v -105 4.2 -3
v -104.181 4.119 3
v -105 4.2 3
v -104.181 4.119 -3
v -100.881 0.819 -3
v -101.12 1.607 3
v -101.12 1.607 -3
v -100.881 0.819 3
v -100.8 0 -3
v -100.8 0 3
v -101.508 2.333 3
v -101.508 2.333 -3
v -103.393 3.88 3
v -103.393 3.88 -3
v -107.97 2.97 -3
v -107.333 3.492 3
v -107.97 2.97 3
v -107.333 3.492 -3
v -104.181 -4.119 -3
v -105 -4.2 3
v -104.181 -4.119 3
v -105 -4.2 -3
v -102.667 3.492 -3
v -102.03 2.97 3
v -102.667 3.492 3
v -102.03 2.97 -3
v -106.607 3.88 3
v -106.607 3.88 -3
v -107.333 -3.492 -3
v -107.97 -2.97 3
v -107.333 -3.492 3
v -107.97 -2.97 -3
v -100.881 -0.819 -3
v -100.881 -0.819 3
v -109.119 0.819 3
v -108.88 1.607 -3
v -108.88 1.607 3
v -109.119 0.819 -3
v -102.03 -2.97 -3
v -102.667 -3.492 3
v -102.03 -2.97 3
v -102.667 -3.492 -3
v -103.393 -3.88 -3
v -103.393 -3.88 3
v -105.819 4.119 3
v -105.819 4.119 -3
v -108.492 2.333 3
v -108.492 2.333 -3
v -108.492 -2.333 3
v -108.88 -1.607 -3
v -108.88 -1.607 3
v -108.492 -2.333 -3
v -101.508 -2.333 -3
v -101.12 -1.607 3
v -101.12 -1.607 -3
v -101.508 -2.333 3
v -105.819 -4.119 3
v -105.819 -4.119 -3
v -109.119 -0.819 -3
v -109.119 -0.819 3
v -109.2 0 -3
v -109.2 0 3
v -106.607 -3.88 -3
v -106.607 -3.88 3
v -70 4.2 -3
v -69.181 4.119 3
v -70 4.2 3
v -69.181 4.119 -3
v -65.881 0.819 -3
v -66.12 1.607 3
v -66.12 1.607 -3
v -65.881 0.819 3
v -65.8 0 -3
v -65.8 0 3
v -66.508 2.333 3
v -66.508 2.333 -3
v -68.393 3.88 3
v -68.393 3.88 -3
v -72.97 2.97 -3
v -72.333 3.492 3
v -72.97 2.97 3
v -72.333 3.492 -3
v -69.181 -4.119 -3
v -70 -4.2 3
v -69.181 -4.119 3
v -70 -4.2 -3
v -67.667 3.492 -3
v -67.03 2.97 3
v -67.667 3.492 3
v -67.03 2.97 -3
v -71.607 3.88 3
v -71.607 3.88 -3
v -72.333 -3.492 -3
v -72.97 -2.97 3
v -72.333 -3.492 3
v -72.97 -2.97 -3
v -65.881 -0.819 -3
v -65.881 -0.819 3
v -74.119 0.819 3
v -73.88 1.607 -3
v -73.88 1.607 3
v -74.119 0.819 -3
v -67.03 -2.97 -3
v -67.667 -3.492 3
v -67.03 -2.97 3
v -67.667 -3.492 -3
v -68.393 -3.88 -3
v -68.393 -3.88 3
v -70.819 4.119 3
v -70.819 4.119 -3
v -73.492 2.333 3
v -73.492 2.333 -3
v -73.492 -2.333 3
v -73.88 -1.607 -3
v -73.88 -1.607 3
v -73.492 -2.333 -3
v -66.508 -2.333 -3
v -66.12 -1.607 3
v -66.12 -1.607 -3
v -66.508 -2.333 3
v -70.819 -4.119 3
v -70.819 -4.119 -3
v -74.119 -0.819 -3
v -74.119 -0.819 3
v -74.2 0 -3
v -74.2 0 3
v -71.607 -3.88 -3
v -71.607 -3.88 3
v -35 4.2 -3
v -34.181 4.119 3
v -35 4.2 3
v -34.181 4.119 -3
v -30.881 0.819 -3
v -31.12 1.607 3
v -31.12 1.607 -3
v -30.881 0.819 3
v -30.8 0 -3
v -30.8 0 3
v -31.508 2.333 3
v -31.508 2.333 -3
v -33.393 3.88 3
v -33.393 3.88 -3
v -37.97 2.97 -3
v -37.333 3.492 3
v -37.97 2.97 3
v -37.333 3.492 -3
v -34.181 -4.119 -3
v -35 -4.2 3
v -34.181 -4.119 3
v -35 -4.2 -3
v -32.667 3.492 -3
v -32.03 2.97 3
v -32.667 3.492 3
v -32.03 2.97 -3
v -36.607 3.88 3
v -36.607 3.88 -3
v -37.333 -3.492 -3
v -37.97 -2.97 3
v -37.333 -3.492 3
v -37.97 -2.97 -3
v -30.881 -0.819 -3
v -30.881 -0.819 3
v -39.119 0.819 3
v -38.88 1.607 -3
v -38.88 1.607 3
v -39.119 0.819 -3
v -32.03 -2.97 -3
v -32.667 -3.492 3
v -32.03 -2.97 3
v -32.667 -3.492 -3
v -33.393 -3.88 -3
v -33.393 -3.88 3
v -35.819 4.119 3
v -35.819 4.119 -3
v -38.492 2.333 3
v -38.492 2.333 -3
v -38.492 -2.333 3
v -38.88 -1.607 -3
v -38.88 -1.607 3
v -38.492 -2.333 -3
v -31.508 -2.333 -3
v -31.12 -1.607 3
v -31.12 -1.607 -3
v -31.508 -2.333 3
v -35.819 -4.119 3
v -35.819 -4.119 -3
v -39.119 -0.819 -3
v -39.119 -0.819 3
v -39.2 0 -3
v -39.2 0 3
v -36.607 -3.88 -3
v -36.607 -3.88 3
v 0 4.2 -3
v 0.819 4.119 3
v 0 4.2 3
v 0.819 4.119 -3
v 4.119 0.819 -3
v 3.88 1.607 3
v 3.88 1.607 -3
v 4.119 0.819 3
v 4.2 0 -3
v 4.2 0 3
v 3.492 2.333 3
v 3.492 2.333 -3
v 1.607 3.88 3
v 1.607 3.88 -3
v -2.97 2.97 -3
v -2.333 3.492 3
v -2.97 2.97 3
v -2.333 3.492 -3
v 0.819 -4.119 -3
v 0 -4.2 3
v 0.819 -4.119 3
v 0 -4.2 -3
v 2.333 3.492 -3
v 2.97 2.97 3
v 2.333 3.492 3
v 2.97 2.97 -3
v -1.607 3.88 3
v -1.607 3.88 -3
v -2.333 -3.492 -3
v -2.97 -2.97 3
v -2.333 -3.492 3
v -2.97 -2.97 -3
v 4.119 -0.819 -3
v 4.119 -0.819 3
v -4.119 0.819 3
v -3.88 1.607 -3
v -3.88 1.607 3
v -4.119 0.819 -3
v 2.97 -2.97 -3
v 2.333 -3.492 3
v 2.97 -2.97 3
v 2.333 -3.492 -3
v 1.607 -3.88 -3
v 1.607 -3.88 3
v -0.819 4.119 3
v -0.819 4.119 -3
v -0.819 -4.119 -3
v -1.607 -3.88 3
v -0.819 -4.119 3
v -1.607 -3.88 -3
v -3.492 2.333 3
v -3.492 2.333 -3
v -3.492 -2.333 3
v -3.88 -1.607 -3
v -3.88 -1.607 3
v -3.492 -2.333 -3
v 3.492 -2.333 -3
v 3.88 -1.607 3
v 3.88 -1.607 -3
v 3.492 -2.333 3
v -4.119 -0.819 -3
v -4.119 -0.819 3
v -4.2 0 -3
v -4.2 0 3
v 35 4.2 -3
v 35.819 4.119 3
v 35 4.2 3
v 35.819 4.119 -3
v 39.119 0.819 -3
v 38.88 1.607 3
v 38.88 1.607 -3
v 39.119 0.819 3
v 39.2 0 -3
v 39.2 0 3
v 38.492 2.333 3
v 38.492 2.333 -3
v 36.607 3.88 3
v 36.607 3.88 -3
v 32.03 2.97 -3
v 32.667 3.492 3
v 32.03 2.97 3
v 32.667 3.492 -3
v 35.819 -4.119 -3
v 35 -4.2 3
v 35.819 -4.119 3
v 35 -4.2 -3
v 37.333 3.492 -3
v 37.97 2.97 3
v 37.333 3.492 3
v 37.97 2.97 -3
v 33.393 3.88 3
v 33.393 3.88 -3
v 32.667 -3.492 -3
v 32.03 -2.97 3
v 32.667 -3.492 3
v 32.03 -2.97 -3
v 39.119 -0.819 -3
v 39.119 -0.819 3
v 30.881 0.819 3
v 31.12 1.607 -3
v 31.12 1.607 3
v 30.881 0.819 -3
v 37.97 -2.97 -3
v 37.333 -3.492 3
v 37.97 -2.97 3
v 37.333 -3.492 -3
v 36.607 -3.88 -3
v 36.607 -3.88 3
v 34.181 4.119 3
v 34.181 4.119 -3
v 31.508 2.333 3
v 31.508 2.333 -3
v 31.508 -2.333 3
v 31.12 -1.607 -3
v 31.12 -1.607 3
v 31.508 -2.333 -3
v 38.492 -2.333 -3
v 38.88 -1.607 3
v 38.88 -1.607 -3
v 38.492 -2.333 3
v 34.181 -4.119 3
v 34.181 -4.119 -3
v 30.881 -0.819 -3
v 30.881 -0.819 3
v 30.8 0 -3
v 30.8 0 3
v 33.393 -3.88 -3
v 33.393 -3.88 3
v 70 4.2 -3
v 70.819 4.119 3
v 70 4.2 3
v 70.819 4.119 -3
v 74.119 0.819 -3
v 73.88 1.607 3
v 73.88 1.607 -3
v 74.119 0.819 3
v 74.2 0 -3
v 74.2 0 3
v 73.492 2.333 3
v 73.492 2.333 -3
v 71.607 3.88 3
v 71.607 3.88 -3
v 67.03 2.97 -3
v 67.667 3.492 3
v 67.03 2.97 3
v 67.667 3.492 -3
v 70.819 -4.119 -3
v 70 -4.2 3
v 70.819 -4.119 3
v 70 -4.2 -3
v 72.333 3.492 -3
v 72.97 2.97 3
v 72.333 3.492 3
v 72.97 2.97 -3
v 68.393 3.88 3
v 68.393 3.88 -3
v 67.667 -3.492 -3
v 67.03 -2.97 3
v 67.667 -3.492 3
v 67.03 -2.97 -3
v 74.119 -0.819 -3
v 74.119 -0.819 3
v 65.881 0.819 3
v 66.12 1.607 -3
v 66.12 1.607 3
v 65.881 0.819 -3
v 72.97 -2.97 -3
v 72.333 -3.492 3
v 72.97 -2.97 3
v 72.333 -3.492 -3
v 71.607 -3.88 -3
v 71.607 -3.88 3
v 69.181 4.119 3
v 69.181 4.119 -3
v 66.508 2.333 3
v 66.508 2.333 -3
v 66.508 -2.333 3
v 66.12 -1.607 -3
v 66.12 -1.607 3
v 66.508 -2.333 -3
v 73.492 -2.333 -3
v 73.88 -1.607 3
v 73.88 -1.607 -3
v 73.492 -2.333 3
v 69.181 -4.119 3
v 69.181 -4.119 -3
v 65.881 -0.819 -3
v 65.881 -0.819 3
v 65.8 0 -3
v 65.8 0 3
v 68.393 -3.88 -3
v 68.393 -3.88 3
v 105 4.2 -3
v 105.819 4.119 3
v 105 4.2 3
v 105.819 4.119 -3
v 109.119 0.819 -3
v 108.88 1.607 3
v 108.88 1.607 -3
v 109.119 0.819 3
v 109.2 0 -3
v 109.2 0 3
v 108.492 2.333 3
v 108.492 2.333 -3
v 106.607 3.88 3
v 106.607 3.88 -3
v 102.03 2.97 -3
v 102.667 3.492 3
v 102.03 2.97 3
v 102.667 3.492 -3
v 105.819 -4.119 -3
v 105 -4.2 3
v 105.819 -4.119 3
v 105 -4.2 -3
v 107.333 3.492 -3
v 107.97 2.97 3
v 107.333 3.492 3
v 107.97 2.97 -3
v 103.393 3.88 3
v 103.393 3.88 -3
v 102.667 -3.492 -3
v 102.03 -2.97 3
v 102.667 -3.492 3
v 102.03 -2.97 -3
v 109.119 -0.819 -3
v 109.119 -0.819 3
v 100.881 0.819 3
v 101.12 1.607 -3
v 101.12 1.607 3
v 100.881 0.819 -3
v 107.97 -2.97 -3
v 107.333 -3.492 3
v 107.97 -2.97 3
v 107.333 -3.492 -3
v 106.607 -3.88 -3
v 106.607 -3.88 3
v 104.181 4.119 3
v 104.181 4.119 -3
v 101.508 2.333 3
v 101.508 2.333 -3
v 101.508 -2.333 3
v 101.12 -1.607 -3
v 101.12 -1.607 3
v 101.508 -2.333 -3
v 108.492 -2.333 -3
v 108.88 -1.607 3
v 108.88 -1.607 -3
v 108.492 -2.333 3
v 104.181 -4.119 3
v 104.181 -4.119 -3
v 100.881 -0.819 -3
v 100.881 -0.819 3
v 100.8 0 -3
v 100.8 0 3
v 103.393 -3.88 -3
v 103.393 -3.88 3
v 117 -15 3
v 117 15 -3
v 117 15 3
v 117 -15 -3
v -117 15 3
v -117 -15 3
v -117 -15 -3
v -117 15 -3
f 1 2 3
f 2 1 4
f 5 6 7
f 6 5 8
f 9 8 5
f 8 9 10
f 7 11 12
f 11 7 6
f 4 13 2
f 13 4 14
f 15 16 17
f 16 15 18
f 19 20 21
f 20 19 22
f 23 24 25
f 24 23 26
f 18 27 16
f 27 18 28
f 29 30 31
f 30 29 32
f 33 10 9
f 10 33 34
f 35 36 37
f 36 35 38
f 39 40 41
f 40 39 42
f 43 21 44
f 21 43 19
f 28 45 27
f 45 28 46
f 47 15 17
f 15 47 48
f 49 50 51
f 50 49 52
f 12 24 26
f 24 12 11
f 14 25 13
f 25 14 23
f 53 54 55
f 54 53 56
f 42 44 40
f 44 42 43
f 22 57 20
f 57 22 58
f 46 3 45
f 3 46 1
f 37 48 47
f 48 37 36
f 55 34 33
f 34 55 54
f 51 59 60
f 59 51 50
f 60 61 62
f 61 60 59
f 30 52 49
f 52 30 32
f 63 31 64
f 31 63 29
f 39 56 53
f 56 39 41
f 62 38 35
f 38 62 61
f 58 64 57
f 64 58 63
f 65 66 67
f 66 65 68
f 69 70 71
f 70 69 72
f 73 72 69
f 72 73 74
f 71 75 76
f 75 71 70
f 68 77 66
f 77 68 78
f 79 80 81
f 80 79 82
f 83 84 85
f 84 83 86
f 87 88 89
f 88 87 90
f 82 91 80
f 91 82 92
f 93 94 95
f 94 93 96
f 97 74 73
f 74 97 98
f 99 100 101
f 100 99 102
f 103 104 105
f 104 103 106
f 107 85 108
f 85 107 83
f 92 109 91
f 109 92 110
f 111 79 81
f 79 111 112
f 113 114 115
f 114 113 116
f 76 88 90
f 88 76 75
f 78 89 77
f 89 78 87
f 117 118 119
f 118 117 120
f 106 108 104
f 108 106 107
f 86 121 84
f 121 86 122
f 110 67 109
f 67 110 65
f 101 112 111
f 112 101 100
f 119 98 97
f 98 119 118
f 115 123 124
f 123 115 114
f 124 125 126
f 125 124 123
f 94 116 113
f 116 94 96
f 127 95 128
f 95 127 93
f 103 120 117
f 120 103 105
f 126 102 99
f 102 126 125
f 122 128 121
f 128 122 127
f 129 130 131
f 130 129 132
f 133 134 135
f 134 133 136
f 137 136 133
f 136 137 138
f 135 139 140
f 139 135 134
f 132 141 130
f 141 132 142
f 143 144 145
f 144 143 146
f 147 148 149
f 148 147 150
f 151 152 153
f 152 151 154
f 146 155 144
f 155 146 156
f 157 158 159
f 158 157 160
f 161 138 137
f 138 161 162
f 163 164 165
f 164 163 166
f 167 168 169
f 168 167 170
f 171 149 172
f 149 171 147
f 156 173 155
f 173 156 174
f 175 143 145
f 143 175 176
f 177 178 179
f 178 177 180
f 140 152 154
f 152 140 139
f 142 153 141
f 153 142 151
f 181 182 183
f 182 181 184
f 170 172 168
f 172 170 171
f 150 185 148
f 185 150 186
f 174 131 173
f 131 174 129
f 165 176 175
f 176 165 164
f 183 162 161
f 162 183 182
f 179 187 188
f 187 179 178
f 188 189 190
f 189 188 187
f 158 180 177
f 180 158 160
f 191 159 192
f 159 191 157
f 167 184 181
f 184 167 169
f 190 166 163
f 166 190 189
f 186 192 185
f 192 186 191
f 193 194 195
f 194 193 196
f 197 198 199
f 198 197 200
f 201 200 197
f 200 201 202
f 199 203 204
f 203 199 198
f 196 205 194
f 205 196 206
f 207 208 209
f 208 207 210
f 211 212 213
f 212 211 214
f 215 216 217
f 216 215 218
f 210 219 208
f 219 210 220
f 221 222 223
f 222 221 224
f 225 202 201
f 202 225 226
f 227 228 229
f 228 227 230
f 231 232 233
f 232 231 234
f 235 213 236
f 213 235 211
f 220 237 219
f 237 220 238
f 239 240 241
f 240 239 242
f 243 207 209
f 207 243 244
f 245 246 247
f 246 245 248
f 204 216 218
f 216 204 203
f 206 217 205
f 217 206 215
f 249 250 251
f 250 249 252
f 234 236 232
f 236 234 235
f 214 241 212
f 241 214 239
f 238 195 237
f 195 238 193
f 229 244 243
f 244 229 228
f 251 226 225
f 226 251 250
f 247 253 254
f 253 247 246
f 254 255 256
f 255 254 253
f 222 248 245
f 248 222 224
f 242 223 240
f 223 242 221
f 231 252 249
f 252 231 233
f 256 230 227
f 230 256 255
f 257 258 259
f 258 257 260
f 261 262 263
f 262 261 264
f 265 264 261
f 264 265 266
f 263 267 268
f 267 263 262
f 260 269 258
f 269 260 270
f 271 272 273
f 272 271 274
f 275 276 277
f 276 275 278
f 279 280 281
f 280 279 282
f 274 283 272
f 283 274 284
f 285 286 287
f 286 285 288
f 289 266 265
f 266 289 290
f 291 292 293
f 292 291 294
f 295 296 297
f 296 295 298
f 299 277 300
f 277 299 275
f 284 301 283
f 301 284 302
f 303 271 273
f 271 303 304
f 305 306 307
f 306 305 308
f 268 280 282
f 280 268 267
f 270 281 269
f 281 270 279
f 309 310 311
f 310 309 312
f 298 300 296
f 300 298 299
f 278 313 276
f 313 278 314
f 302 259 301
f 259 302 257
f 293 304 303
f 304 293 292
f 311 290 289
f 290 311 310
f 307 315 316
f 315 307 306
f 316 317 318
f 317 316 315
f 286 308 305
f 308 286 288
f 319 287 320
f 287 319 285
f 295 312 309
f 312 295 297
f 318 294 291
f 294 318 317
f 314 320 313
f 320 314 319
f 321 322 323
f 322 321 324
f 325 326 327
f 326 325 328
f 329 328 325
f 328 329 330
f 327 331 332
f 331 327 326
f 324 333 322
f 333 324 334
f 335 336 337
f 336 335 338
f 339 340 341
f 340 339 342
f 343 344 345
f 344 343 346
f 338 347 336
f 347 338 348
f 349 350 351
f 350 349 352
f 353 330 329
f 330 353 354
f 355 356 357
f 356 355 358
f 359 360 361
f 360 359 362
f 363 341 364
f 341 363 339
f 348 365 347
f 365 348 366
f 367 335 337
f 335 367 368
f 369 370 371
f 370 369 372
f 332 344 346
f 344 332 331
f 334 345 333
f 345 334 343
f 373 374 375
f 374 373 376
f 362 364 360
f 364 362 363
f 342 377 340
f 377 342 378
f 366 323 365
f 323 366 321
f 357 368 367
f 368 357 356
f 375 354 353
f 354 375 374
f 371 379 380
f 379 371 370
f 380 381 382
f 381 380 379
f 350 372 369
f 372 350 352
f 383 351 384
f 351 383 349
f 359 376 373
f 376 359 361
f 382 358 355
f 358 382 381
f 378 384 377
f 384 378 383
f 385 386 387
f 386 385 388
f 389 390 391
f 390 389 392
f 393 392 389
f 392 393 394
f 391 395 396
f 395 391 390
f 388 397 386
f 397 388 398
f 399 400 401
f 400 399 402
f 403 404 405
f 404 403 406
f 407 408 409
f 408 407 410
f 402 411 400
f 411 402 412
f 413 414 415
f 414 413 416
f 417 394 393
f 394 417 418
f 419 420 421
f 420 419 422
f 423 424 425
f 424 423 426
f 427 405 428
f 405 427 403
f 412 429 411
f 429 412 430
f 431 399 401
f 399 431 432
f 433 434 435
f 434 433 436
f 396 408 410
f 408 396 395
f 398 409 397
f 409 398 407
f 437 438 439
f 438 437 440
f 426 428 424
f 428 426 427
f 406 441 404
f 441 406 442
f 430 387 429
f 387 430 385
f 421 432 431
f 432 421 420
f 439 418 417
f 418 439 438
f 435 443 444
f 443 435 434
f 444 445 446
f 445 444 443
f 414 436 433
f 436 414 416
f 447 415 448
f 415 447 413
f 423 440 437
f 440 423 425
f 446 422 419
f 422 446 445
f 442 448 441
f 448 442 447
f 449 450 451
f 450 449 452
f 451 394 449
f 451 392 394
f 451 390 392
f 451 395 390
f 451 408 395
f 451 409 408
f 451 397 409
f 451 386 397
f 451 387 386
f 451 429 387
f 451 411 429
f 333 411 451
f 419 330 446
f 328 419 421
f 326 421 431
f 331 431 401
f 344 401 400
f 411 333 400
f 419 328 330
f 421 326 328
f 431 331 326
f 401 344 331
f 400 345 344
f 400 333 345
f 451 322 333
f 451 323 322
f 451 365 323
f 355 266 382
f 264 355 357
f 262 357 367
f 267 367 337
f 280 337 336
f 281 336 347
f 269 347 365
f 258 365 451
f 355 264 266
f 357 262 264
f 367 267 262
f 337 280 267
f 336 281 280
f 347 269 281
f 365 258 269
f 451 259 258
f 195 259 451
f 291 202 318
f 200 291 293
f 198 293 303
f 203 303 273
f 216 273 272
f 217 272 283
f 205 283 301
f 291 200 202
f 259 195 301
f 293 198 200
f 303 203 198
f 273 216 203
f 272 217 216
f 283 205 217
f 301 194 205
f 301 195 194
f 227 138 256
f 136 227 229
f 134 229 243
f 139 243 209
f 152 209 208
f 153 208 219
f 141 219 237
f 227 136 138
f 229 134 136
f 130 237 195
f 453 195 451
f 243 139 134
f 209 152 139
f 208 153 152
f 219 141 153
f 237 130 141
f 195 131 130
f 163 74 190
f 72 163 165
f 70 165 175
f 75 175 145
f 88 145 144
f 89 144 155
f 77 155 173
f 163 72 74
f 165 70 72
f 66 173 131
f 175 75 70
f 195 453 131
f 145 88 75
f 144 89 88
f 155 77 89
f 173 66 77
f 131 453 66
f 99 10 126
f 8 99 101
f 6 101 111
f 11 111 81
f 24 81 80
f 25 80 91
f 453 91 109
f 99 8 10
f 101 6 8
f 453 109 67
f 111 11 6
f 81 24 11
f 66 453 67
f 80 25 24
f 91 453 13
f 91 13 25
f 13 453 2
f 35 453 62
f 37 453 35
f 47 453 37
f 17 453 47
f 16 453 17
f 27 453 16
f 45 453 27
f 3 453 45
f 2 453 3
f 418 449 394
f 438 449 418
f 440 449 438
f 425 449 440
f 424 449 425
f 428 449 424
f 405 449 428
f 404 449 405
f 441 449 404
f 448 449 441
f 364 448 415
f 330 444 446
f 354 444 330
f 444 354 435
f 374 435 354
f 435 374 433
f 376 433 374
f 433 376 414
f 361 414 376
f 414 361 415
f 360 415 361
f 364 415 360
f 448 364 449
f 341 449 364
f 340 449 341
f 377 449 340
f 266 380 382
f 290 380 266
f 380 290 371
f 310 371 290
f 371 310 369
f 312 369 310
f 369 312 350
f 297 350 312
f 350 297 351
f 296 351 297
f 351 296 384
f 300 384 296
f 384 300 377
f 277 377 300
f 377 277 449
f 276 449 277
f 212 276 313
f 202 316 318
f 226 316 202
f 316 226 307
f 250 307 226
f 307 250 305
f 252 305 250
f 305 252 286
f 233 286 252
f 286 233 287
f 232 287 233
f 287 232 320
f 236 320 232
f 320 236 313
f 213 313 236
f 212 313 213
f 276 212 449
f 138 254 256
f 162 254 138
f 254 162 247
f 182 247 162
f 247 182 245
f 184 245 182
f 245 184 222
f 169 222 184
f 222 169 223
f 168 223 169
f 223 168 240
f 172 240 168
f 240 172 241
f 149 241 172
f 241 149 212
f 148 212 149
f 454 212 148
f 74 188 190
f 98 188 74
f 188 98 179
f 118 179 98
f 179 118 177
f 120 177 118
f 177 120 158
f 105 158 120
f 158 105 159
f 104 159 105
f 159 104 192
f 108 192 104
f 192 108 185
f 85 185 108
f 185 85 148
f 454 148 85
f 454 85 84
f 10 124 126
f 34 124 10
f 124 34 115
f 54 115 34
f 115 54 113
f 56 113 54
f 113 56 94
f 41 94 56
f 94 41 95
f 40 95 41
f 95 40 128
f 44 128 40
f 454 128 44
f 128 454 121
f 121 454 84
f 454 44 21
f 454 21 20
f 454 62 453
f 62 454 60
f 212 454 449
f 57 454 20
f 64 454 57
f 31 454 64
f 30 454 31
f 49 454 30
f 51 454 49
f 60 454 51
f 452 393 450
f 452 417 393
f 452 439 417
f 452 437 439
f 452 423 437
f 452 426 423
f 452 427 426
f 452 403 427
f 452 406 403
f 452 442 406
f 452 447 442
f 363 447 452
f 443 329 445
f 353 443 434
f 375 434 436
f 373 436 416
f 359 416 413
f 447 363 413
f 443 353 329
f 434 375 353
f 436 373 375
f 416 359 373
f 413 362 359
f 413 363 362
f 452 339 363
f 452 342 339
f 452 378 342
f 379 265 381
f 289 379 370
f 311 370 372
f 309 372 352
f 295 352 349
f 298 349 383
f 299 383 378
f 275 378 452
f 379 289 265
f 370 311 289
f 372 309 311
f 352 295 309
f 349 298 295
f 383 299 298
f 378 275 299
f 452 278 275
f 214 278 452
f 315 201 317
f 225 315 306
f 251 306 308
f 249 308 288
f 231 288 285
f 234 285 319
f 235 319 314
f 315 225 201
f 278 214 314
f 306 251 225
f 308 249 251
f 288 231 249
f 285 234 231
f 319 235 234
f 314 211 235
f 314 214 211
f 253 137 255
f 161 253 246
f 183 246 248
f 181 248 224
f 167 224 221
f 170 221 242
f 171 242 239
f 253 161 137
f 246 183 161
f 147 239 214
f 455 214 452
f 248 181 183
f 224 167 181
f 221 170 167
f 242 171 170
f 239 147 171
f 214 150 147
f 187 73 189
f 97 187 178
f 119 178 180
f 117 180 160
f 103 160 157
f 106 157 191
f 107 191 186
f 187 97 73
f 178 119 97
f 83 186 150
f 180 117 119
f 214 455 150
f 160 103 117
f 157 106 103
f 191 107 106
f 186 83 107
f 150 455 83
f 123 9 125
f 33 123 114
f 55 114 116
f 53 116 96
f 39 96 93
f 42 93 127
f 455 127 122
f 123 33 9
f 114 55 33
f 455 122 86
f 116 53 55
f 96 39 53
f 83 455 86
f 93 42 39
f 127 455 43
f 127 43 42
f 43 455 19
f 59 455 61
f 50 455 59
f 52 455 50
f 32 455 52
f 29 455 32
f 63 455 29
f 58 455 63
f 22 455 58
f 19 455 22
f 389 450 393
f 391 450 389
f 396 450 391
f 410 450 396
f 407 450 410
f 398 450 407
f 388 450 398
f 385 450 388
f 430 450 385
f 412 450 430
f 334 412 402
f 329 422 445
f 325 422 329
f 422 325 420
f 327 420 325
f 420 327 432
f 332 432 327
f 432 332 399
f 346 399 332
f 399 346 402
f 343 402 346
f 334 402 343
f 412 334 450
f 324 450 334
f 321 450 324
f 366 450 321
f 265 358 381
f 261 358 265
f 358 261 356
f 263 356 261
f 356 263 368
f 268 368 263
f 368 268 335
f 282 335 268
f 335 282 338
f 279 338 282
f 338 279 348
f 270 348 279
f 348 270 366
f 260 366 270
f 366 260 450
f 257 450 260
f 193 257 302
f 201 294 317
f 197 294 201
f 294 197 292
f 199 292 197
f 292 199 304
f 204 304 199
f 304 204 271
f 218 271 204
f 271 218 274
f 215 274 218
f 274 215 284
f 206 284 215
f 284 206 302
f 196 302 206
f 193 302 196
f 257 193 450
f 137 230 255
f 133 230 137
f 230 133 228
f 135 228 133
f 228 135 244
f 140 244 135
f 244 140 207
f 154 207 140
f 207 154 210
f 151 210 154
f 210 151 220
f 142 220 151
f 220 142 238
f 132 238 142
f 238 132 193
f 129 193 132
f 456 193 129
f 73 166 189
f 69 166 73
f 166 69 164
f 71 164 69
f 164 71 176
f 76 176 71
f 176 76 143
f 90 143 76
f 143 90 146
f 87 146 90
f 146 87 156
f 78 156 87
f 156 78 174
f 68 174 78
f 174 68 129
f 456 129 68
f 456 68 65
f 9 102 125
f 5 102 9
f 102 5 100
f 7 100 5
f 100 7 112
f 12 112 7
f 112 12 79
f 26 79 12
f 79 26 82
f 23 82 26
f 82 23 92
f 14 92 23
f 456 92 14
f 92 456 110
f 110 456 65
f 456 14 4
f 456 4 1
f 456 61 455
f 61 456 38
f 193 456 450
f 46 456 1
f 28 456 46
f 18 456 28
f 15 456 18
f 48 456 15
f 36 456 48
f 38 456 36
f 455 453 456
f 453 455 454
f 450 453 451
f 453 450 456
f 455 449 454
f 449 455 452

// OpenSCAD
$fn = 32;

// ----------------------------------------------------------------------
// Hole bar, 7 x Ø8.4
// row layout, 12 mm edge offset
// ----------------------------------------------------------------------

// --- parameters (mm) ---
bar_w = 30;    // bar width (Y)
bar_t = 6;     // bar thickness (Z)
holes = 7;     // holes per row
hole_d = 8.4;  // hole diameter
edge = 12;     // offset from the bar end to the first hole
pitch = 35;    // pitch between neighbouring holes

// --- derived feature positions (mm) ---
span = (holes - 1) * pitch;   // = 210   distance between the end holes
bar_l = span + 2 * edge;      // = 234   overall bar length
start_x = -bar_l / 2 + edge;  // = -105   X of the first hole
feature_centers = [
  [start_x + 0 * pitch, 0],
  [start_x + 1 * pitch, 0],
  [start_x + 2 * pitch, 0],
  [start_x + 3 * pitch, 0],
  [start_x + 4 * pitch, 0],
  [start_x + 5 * pitch, 0],
  [start_x + 6 * pitch, 0]
];   // hole centres of the first row

// bar with one row of holes, drilled from feature_centers
difference() {
  translate([-bar_l / 2, -bar_w / 2, -bar_t / 2]) cube([bar_l, bar_w, bar_t]);
  for (centre = feature_centers)
    translate([centre[0], centre[1], 0])
      cylinder(d = hole_d, h = bar_t + 2, center = true);
}
